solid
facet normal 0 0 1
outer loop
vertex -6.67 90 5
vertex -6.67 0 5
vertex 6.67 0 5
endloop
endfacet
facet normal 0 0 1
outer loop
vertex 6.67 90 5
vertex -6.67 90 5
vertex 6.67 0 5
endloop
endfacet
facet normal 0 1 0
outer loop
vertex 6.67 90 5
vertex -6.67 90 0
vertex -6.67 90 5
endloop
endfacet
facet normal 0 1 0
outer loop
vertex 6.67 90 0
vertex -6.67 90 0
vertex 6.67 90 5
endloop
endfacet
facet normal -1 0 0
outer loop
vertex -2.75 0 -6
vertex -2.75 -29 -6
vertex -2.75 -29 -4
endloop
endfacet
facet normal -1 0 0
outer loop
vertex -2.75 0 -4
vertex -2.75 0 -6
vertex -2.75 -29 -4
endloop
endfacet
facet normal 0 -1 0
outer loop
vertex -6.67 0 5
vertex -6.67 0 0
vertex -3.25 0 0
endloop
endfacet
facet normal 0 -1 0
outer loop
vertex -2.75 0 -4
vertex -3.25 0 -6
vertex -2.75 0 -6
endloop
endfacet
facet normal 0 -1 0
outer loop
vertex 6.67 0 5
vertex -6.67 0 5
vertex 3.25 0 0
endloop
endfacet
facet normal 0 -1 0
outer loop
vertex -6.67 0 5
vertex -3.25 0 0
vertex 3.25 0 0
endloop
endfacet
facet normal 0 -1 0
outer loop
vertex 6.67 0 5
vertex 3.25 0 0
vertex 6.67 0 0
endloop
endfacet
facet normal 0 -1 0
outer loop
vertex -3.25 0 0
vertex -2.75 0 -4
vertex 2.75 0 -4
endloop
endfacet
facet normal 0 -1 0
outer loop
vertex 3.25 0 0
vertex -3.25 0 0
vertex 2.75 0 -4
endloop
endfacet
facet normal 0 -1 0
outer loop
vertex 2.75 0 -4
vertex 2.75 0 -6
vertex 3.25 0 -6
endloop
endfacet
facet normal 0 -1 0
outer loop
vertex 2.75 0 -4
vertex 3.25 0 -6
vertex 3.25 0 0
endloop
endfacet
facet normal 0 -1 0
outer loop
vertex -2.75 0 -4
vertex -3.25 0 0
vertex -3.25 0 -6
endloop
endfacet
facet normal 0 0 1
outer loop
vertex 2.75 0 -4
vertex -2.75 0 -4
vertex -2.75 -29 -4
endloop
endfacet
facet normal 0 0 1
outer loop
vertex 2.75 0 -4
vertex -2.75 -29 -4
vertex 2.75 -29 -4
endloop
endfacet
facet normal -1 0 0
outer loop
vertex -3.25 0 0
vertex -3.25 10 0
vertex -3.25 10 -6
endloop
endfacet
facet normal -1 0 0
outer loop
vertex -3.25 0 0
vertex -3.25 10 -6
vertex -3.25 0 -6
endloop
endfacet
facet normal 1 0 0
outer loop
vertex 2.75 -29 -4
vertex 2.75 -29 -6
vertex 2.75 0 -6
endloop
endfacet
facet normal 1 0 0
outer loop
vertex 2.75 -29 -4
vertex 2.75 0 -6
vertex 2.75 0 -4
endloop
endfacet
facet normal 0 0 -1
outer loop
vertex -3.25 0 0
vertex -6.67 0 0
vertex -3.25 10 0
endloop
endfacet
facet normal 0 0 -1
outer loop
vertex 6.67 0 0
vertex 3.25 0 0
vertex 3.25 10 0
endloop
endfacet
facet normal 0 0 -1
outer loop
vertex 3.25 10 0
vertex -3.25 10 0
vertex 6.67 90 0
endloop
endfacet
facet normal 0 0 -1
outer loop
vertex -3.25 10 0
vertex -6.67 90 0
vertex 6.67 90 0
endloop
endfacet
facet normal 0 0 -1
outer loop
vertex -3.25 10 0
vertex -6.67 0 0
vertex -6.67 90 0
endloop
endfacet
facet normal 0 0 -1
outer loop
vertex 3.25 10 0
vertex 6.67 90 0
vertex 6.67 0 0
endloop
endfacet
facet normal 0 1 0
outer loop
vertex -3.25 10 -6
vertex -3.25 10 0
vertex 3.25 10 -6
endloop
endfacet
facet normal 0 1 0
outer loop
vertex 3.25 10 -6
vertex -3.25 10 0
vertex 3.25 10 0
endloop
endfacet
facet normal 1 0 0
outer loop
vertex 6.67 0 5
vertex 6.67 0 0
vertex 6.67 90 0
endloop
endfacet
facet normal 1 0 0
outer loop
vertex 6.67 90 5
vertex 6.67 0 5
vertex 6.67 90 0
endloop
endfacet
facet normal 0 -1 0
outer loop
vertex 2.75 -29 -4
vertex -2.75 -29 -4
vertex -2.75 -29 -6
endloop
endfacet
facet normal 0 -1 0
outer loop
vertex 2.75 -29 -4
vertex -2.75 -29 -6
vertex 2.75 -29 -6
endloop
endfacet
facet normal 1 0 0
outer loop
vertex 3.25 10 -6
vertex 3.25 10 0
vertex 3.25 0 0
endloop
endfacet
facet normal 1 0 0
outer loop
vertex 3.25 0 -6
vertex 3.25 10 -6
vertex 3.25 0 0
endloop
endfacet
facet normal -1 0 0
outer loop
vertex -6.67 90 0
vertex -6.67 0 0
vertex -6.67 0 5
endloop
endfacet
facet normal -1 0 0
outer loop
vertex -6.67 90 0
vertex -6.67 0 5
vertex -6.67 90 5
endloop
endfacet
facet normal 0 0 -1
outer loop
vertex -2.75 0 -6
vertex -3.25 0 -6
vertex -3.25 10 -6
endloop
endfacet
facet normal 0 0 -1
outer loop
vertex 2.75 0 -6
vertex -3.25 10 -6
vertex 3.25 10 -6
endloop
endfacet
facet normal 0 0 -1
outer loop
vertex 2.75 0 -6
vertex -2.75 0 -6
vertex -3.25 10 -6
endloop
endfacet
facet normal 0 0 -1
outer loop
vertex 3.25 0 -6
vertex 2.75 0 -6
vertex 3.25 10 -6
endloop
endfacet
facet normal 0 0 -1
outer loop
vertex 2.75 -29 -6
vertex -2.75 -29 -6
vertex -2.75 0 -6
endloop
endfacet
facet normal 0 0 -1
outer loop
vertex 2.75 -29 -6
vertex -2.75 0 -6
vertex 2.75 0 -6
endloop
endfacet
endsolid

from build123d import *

# Parameters (mm, degrees)
SKETCH_W     = 13.34
SKETCH_H     = 90
PAD_DEPTH    = 5
SKETCH001_W  = 6.5
SKETCH001_H  = 10
PAD001_DEPTH = 6
SKETCH002_W  = 5.5
SKETCH002_H  = 2
PAD002_DEPTH = 29


with BuildPart() as part:
    # Sketch → Pad (new body)
    with BuildSketch(Plane.XY):
        with Locations((0, 45)):
            Rectangle(SKETCH_W, SKETCH_H)
    extrude(amount=PAD_DEPTH)

    # Sketch001 (on Face5 of Pad) → Pad001 (join)
    with BuildSketch(Plane(origin=(0, 0, 0), x_dir=(1, 0, 0), z_dir=(0, 0, -1))):
        with Locations((0, -5)):
            Rectangle(SKETCH001_W, SKETCH001_H)
    extrude(amount=PAD001_DEPTH)

    # Sketch002 (on Face5 of Pad001) → Pad002 (join)
    with BuildSketch(Plane.XZ):
        with Locations((0, -5)):
            Rectangle(SKETCH002_W, SKETCH002_H)
    extrude(amount=PAD002_DEPTH)


solid = part.part
